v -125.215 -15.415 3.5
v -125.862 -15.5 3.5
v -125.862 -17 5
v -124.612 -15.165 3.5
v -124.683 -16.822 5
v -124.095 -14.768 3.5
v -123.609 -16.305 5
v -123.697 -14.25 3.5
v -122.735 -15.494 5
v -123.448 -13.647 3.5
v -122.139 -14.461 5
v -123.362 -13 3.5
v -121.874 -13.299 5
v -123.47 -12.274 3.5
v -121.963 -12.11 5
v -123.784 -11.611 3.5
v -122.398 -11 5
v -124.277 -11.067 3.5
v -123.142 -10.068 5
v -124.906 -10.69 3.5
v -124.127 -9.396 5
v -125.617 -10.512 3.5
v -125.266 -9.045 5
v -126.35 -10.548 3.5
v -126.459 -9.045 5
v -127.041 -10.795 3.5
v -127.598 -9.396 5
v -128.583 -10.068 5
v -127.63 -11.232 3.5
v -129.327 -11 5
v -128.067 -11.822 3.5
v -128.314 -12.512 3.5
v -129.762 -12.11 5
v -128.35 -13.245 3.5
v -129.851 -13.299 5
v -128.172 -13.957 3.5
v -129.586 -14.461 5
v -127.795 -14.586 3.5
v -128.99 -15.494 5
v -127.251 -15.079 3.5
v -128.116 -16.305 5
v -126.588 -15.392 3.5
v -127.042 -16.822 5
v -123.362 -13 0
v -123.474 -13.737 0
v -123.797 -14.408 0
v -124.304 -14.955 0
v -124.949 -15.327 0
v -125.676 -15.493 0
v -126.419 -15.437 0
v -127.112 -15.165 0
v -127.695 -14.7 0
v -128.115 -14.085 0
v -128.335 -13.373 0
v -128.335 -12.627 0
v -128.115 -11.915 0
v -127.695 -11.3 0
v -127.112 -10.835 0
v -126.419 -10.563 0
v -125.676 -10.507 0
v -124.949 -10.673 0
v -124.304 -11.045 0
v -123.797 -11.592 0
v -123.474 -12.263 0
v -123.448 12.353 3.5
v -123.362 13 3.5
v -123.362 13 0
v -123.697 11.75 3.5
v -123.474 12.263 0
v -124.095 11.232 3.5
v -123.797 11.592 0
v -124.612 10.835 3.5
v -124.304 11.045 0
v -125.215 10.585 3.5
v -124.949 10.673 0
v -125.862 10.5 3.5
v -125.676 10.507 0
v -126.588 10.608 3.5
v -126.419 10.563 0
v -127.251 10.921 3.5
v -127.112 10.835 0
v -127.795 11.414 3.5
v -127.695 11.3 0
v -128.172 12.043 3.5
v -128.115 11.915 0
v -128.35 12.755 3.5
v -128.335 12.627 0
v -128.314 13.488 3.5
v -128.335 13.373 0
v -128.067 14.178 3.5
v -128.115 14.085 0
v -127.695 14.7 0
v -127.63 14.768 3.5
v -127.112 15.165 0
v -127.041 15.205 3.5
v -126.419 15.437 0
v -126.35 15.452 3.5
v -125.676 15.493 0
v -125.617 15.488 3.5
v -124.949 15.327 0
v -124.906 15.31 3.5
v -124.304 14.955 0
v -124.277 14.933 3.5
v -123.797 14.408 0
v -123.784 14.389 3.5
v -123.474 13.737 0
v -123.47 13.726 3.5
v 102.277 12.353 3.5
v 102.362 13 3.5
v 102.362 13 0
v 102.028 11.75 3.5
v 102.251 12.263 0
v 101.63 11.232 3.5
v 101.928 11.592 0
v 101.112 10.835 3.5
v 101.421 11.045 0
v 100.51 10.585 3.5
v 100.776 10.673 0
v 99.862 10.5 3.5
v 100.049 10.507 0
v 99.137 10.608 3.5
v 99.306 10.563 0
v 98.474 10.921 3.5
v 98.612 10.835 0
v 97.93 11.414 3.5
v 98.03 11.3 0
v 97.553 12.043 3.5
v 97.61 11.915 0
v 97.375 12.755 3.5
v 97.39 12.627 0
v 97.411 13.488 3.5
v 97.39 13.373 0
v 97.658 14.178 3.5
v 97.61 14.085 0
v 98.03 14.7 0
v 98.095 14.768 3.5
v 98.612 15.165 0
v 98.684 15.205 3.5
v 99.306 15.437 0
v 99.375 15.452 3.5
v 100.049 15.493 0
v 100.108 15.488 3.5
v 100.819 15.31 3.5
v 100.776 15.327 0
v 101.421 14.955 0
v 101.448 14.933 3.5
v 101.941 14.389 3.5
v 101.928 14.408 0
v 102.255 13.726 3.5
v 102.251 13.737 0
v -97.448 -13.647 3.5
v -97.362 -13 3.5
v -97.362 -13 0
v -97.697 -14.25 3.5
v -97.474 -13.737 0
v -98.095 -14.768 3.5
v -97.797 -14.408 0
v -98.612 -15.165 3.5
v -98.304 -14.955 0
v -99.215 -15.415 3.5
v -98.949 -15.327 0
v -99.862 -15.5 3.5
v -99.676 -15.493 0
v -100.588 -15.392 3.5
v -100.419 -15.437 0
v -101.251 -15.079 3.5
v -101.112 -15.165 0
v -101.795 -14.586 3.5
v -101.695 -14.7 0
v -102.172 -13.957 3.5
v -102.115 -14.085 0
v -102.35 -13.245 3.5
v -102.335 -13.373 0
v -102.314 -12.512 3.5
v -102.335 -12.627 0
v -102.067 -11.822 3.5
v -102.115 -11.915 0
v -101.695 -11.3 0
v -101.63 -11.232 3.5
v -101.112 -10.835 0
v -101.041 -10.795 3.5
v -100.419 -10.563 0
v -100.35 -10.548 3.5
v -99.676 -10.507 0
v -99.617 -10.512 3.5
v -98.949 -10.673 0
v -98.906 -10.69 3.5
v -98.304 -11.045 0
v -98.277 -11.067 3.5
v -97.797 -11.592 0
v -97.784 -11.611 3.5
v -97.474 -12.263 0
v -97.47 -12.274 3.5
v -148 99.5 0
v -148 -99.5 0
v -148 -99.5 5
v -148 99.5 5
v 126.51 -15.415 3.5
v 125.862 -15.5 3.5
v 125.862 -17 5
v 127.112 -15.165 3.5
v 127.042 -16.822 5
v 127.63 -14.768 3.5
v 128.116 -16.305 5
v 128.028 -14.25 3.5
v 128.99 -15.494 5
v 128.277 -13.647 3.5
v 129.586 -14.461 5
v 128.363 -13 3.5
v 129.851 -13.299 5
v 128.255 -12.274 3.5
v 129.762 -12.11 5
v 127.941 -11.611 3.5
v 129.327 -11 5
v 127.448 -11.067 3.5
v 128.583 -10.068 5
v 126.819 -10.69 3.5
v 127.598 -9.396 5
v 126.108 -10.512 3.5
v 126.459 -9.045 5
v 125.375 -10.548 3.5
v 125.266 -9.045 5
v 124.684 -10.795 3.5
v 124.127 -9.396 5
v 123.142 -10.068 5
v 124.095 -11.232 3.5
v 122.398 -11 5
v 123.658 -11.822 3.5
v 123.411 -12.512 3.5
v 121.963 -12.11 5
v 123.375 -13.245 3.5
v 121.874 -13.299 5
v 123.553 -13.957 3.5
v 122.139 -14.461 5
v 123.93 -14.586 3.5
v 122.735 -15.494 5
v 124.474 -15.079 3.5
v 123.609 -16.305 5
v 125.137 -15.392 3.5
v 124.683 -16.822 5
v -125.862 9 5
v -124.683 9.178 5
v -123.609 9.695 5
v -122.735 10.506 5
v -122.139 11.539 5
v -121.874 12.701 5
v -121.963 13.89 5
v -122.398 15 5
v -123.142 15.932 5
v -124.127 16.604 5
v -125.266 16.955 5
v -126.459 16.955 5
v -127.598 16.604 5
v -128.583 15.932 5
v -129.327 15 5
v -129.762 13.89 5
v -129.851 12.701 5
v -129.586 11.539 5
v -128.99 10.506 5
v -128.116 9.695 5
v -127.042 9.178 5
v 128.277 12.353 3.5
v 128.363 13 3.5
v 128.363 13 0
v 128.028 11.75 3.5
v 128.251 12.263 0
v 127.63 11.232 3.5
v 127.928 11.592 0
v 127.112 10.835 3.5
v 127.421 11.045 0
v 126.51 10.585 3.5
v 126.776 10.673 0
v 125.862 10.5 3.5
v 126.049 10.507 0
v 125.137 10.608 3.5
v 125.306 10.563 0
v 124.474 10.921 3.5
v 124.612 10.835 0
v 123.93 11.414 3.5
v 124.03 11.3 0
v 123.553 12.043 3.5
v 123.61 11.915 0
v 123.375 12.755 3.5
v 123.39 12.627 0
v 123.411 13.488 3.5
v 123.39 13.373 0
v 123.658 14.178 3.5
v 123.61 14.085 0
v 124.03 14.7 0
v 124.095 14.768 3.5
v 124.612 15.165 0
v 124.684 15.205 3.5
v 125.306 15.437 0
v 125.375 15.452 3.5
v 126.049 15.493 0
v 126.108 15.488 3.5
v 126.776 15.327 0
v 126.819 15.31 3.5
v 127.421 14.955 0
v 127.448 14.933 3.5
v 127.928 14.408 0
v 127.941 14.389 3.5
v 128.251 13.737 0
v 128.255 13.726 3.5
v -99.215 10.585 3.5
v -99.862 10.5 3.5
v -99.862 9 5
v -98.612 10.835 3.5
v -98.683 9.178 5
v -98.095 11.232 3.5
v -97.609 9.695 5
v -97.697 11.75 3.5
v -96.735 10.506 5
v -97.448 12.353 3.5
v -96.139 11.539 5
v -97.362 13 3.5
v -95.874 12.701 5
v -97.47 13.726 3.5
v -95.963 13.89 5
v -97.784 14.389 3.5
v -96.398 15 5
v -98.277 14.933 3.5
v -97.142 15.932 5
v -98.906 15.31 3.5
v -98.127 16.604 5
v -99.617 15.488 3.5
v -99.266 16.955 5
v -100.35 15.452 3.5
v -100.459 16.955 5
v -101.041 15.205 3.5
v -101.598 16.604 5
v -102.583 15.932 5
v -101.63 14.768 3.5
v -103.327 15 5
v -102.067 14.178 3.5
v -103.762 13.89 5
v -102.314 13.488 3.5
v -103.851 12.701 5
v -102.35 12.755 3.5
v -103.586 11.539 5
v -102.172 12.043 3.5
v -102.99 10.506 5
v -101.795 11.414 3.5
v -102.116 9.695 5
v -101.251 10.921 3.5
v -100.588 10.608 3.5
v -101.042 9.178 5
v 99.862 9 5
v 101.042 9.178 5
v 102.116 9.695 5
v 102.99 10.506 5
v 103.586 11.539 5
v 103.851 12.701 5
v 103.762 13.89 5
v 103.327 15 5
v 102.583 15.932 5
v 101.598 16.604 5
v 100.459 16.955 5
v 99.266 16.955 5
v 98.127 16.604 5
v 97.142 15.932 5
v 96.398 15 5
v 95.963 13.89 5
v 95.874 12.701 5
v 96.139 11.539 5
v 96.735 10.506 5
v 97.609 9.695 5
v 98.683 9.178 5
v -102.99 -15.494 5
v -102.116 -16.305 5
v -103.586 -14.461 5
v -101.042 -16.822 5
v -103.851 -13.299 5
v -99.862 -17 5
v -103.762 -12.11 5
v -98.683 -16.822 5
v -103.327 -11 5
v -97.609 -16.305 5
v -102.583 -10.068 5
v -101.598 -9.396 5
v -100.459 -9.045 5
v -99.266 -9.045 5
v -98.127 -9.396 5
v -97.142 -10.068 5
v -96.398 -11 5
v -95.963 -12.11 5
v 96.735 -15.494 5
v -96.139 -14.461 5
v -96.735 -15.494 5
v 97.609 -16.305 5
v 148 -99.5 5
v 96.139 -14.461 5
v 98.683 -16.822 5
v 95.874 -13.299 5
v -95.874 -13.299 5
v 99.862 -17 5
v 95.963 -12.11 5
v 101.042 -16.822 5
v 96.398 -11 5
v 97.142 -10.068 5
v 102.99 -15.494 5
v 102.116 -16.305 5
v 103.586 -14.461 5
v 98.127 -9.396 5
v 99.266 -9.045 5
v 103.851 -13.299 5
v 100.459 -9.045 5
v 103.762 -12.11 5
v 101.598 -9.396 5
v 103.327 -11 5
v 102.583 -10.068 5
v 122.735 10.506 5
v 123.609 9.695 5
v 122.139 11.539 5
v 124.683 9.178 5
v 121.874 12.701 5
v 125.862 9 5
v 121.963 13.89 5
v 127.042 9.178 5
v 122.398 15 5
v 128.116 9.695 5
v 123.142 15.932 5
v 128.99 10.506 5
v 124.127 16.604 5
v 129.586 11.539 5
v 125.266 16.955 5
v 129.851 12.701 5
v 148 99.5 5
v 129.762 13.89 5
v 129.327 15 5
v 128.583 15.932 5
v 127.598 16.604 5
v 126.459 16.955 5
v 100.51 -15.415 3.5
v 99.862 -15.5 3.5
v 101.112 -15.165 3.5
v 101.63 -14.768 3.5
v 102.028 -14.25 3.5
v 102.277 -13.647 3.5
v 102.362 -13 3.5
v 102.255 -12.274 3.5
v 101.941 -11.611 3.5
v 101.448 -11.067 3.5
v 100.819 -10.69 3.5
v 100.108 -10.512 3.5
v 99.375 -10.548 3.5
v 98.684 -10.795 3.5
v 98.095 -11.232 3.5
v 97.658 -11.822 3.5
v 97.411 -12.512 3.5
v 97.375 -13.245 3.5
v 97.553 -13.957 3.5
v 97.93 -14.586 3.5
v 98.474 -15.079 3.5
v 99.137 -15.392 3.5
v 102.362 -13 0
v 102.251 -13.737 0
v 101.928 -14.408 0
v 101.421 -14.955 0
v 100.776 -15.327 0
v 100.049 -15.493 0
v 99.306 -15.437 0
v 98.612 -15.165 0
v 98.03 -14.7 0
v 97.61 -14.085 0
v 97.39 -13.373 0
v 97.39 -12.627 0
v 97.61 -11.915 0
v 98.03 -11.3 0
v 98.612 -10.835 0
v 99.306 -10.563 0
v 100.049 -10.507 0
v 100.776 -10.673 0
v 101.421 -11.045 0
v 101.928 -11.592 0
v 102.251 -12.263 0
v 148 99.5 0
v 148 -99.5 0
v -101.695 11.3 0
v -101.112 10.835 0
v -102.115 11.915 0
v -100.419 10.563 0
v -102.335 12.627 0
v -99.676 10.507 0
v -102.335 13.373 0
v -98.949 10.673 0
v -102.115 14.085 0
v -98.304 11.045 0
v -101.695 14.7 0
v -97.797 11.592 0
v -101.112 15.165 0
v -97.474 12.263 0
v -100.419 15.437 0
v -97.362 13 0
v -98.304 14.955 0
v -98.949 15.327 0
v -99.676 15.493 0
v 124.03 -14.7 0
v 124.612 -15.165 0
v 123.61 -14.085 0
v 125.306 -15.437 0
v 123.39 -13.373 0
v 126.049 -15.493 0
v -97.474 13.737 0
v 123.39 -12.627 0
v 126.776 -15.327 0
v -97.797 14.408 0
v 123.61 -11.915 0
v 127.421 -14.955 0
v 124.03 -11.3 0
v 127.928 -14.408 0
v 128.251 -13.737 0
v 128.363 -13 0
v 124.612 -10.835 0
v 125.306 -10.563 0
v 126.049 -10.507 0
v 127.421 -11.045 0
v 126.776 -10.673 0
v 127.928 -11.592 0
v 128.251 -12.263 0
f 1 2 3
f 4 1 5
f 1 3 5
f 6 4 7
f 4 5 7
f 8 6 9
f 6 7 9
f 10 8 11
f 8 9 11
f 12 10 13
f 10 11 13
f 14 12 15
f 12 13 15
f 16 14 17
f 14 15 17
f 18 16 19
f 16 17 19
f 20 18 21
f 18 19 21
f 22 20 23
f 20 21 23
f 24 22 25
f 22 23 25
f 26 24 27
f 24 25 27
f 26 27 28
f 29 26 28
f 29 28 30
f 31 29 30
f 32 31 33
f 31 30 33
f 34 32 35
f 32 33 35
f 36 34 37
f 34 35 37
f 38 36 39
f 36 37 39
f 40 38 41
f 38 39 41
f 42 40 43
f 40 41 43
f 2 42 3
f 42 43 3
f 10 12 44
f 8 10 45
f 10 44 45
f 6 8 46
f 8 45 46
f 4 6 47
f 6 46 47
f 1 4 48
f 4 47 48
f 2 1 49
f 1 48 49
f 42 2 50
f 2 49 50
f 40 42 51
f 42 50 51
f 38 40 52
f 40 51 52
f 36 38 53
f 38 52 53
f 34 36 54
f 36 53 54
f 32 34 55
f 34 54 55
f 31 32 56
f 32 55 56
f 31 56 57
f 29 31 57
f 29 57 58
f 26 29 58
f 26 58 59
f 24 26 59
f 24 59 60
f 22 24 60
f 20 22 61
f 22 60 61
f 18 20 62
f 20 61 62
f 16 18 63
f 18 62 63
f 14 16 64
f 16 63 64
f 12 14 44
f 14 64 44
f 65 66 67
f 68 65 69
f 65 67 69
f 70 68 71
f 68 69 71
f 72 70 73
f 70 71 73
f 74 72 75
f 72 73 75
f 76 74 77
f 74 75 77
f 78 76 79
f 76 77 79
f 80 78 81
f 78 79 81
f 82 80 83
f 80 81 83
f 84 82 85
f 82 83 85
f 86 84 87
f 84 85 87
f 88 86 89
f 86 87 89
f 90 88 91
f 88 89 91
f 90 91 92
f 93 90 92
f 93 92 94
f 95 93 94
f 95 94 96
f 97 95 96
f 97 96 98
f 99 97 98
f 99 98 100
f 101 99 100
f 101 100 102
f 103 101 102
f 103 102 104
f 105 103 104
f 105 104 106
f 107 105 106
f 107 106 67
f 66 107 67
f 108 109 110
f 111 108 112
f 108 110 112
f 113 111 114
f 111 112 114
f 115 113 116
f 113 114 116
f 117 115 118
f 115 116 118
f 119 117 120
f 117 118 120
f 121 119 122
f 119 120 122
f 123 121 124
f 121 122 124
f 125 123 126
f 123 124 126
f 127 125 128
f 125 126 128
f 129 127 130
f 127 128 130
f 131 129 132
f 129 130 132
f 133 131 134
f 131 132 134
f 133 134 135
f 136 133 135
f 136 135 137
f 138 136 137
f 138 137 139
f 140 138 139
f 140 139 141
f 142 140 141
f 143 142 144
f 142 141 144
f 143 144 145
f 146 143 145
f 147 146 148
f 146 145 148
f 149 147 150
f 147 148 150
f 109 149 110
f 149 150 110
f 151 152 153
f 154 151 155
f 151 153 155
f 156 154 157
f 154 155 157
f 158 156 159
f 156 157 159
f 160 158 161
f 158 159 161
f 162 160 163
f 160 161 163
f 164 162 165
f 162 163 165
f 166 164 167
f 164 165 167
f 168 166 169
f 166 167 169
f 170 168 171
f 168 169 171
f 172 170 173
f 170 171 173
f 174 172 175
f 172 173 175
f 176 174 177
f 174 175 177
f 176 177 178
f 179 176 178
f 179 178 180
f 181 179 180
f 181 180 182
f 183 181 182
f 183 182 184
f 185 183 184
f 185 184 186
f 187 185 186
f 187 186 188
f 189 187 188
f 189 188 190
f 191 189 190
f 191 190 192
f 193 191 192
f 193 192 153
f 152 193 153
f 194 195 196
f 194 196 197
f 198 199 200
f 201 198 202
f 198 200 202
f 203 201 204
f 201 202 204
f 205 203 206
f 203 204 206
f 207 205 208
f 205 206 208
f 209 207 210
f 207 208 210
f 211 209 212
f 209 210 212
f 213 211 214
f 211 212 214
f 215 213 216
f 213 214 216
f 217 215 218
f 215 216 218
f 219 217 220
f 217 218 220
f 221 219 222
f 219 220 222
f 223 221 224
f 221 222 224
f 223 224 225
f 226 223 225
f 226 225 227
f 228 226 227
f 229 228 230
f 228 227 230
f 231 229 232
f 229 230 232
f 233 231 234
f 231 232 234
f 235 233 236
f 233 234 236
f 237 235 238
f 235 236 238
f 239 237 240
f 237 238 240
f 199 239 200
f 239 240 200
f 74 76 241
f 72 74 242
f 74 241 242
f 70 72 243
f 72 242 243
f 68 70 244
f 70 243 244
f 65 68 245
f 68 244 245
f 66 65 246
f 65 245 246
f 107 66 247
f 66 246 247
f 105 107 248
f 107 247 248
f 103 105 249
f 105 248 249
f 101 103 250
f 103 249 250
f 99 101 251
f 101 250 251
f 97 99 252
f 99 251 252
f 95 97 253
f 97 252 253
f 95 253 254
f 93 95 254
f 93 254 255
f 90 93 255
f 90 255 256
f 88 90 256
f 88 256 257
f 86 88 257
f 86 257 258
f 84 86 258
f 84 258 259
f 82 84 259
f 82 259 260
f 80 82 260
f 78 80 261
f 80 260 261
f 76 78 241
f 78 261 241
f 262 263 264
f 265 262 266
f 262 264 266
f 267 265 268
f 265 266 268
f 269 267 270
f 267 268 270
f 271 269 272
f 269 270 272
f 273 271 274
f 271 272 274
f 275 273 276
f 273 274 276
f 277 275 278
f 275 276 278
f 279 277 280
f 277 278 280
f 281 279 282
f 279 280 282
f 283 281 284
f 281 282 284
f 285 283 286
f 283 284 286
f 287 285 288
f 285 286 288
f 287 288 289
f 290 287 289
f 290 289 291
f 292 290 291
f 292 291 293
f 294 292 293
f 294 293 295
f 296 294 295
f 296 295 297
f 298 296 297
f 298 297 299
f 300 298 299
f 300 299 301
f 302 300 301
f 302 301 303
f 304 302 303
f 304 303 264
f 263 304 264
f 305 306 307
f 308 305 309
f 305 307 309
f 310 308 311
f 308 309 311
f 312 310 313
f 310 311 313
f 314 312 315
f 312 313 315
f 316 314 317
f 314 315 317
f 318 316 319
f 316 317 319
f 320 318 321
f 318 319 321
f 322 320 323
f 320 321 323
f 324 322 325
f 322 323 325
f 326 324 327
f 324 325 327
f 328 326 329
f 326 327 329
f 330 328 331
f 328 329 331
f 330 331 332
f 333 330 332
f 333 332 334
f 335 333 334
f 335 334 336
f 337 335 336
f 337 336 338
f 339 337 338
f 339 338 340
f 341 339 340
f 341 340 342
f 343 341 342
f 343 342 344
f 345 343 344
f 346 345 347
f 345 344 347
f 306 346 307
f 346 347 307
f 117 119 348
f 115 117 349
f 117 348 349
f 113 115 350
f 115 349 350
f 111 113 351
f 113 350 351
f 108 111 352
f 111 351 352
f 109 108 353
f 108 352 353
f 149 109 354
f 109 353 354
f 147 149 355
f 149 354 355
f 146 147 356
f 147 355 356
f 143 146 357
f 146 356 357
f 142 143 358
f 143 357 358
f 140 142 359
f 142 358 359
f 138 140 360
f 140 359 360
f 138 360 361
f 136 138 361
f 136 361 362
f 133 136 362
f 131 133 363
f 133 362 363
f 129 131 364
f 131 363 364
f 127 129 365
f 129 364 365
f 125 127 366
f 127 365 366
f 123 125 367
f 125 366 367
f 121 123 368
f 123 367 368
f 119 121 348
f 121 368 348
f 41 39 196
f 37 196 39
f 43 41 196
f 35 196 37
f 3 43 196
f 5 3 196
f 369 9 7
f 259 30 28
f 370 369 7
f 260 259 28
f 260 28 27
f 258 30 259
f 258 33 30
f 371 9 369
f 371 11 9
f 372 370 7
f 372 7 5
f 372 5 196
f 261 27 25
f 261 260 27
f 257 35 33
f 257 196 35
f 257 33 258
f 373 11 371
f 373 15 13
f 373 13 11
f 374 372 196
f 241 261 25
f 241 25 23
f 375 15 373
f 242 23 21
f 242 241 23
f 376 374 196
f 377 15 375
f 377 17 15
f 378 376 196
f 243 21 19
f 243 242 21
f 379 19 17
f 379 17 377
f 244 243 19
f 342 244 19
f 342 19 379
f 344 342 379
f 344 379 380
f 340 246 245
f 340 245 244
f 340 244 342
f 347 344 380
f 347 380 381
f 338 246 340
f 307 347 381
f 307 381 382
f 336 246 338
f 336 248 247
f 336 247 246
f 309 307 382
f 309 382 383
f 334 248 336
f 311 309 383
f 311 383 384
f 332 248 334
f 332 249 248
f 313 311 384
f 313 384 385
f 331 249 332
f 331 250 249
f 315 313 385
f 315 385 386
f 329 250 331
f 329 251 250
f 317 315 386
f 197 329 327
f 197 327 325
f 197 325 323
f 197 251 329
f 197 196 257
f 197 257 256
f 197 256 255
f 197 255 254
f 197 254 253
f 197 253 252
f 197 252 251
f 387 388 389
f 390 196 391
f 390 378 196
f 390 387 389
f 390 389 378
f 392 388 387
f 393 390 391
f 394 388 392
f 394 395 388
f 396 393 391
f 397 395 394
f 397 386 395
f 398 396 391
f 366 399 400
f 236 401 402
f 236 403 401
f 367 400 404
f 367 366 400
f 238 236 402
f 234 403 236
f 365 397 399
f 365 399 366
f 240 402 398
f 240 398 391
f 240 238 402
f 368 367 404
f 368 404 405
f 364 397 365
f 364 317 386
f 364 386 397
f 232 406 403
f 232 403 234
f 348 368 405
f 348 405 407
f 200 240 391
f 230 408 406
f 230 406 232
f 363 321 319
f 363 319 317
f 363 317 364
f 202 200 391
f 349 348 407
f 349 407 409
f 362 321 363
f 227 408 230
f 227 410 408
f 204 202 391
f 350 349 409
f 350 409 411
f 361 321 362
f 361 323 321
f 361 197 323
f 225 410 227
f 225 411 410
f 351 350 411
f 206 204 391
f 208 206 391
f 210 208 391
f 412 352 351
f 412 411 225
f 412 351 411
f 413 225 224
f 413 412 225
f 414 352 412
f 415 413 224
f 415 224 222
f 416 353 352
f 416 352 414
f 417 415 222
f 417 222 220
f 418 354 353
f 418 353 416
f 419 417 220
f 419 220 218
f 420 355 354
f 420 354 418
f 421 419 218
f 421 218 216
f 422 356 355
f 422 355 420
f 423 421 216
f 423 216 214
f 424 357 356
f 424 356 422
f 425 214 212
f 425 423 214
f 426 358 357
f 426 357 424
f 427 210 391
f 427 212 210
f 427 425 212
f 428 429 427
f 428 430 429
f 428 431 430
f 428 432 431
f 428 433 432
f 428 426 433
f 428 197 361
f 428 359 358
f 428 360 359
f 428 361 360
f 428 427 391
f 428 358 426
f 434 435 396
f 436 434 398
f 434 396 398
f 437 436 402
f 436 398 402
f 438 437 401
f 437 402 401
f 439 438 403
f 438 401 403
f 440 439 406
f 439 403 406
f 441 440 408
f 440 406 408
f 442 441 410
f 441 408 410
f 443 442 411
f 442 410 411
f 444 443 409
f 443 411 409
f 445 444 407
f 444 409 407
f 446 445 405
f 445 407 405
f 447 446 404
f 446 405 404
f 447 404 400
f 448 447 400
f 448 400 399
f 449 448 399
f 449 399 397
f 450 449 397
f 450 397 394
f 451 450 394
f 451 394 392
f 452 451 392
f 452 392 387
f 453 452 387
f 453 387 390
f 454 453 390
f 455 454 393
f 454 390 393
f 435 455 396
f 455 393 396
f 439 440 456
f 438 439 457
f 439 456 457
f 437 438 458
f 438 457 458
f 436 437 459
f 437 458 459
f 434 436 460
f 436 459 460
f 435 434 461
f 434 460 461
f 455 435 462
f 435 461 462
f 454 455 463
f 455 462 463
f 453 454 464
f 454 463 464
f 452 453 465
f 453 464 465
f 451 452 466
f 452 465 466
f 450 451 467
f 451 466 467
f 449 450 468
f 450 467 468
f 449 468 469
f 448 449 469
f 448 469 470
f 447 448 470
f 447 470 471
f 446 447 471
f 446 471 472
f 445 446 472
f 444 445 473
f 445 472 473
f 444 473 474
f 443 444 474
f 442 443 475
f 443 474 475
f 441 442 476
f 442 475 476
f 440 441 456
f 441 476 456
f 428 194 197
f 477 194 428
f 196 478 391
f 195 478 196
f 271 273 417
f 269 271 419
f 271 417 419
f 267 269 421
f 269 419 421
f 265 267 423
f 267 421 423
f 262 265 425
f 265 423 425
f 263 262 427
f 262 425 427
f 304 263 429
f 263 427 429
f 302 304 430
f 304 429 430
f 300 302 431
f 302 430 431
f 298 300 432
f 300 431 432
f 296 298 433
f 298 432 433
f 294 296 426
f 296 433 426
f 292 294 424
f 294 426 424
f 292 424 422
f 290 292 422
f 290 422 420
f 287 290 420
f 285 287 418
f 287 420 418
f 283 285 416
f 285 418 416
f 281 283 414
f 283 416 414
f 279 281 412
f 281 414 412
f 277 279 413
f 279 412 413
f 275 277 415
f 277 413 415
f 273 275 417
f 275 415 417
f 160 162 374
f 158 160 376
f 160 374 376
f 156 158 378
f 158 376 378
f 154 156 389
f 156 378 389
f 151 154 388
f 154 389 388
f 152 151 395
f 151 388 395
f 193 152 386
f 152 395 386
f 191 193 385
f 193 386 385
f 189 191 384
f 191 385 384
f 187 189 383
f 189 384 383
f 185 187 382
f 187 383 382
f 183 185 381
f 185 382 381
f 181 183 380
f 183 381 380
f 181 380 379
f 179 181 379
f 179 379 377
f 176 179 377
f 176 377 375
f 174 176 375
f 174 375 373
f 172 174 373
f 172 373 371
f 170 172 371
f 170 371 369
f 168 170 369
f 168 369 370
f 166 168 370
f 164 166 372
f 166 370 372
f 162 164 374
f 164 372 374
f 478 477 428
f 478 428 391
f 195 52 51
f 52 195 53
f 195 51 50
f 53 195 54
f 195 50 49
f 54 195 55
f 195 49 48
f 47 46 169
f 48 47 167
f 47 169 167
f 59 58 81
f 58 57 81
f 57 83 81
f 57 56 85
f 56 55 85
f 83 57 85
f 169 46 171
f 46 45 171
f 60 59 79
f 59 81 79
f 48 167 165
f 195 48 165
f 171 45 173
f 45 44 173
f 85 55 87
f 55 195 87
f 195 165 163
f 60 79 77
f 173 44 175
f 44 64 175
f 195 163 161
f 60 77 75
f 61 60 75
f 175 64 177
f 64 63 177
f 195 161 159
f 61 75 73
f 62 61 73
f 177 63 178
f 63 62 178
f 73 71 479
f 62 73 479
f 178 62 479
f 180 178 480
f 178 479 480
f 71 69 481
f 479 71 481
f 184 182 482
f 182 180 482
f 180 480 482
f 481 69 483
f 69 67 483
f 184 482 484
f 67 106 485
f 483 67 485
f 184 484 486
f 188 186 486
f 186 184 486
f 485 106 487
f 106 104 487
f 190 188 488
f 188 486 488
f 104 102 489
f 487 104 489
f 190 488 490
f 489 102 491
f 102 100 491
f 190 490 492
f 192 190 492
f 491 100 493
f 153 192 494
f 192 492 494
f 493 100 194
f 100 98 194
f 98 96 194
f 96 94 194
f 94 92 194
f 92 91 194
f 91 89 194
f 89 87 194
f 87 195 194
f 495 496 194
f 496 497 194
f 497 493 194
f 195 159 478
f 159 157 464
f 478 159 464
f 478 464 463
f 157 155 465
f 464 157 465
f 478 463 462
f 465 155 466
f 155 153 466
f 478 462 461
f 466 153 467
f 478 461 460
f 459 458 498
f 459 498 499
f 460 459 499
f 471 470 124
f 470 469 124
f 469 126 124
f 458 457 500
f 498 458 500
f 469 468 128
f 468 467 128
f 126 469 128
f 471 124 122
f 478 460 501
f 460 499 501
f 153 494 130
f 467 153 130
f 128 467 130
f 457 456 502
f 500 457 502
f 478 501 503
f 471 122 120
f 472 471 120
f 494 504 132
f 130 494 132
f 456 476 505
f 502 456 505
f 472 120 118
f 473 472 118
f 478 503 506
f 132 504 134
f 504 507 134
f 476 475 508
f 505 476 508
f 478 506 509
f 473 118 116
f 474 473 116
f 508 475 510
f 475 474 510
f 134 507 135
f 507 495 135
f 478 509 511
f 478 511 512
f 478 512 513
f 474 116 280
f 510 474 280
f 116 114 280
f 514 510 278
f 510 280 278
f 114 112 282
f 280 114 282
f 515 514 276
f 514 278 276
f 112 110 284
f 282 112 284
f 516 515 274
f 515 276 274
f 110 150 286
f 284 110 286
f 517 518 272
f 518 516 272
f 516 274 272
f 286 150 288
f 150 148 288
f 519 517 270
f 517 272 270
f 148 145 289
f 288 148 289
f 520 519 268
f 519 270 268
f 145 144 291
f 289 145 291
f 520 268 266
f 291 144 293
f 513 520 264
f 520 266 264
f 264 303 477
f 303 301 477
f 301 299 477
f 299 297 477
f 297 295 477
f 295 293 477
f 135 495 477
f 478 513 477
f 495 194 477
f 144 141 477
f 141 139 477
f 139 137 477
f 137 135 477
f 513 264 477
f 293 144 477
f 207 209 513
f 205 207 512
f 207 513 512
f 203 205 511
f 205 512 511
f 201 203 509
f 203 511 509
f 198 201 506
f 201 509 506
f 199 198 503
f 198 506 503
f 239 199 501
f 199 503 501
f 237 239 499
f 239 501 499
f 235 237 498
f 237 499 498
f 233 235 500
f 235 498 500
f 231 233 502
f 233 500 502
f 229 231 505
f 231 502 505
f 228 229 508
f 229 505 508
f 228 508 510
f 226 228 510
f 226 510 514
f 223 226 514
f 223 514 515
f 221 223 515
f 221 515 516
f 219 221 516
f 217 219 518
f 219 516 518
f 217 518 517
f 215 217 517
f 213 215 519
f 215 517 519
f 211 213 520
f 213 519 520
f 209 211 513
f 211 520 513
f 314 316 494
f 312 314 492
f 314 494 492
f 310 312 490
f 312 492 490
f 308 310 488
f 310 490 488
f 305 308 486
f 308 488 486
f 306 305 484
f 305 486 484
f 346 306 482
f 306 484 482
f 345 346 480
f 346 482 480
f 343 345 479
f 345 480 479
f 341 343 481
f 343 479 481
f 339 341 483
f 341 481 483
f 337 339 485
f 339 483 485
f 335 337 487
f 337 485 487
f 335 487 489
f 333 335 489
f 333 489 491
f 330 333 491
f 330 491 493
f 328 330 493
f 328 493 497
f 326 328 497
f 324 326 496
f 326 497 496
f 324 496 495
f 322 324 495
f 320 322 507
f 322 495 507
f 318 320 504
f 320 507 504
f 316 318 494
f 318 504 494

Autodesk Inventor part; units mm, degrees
ref_plane "YZ Plane" through (0, 0, 0) normal (1, 0, 0) x (0, 1, 0)
ref_plane "XZ Plane" through (0, 0, 0) normal (0, 1, 0) x (-1, 0, 0)
sketch "Sketch1" plane through (0, 0, 0) normal (0, 0, 1) x (1, 0, 0)
  line L0 (148, -99.5) -> (-148, -99.5)
  line L1 (-148, -99.5) -> (-148, 99.5)
  line L2 (-148, 99.5) -> (148, 99.5)
  line L3 (148, 99.5) -> (148, -99.5)
  line L4 (148, -99.5) -> (-148, 99.5) construction
  line L5 (-148, -99.5) -> (148, 99.5) construction
  circle A0 centre (-125.8625, 13) radius 2.5
  circle A1 centre (-125.8625, -13) radius 2.5
  circle A2 centre (-99.8625, 13) radius 2.5
  circle A3 centre (-99.8625, -13) radius 2.5
  line L6 (-125.8625, 13) -> (-125.8625, -13)
  line L7 (-125.8625, 0) -> (-98, 0)
  line L8 (0, 99.5) -> (0, -99.5) construction
  line L9 (-148, 0) -> (148, 0) construction
  circle A4 centre (125.8625, 13) radius 2.5
  circle A5 centre (125.8625, -13) radius 2.5
  circle A6 centre (99.8625, 13) radius 2.5
  circle A7 centre (99.8625, -13) radius 2.5
  line L10 (125.8625, 13) -> (125.8625, -13)
  line L11 (125.8625, 0) -> (98, 0)
  line L12 (148, 0) -> (-148, 0) construction
  point P0 (0, 0)
  dimension "d0" = 296
  dimension "d1" = 199
  dimension "d4" = 26
  dimension "d7" = 26
  dimension "d10" = 22.1375
  dimension "d14" = 5
extrude "Extrusion1" add sketch "Sketch1" along normal blind 5
hole "Hole1" at (-125.8625, 13, 5) direction (0, 0, -1) diameter 4.5 end through all countersink diameter 8 countersink angle 90
pattern_linear "Rectangular Pattern1" count 2 spacing 26 along (0, -1, 0) count 2 spacing 26 along (1, 0, 0) of "Hole1"
ref_plane "Work Plane1" through (0, -99.5, 0) normal (1, 0, 0) x (0, 0, -1)
mirror "Mirror1" about plane through (0, -99.5, 0) normal (1, 0, 0) of "Hole1", "Rectangular Pattern1"
properties part number "Y_CARRIAGE"
